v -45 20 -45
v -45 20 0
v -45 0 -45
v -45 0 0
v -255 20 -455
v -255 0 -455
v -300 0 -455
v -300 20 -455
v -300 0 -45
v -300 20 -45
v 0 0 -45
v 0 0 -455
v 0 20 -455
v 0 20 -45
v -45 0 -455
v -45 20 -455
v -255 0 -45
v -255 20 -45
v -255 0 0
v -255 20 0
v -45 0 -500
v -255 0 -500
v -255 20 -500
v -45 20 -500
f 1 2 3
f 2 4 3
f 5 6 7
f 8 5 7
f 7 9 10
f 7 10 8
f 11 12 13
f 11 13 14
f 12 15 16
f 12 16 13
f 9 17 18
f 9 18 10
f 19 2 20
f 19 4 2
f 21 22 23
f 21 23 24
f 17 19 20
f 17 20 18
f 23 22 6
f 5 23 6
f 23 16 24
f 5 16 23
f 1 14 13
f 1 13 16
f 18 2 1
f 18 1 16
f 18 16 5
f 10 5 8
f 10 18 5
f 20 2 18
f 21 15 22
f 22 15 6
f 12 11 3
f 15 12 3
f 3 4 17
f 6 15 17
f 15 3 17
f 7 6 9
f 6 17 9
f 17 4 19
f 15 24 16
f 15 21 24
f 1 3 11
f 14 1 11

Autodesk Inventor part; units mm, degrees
ref_plane "YZ Plane" through (0, 0, 0) normal (1, 0, 0) x (0, 1, 0)
ref_plane "XZ Plane" through (0, 0, 0) normal (0, 1, 0) x (-1, 0, 0)
ref_plane "XY Plane" through (0, 0, 0) normal (0, 0, 1) x (1, 0, 0)
sketch "Sketch2" plane through (0, 0, 0) normal (0, 1, 0) x (-1, 0, 0)
  line L0 (0, 0) -> (300, 0)
  line L1 (300, 0) -> (300, -500)
  line L2 (300, -500) -> (0, -500)
  line L3 (0, -500) -> (0, 0)
  line L4 (300, 0) -> (255, 0)
  line L5 (255, 0) -> (255, -45)
  line L6 (255, -45) -> (300, -45)
  line L7 (300, -45) -> (300, 0)
  line L8 (300, -500) -> (255, -500)
  line L9 (255, -500) -> (255, -455)
  line L10 (255, -455) -> (300, -455)
  line L11 (300, -455) -> (300, -500)
  line L12 (0, -500) -> (45, -500)
  line L13 (45, -500) -> (45, -455)
  line L14 (45, -455) -> (0, -455)
  line L15 (0, -455) -> (0, -500)
  line L16 (0, 0) -> (45, 0)
  line L17 (45, 0) -> (45, -45)
  line L18 (45, -45) -> (0, -45)
  line L19 (0, -45) -> (0, 0)
  point P0 (0, -45)
  point P1 (0, -455)
  point P2 (300, -455)
  point P3 (255, 0)
  point P4 (45, 0)
  dimension "d0" = 300
  dimension "d1" = 500
  dimension "d12" = 45
  dimension "d13" = 45
  dimension "d14" = 45
  dimension "d15" = 45
  dimension "d16" = 45
  dimension "d17" = 45
  dimension "d18" = 45
  dimension "d19" = 45
ref_plane "Work Plane1" through (0, 20, 0) normal (0, 1, 0) x (1, 0, 0)
extrude "Extrusion2" add sketch "Sketch2" along normal blind 20 contours L0 L5 L6 L1 L10 L9 L2 L13 L14 L3 L18 L17
properties part number "Shelf"
